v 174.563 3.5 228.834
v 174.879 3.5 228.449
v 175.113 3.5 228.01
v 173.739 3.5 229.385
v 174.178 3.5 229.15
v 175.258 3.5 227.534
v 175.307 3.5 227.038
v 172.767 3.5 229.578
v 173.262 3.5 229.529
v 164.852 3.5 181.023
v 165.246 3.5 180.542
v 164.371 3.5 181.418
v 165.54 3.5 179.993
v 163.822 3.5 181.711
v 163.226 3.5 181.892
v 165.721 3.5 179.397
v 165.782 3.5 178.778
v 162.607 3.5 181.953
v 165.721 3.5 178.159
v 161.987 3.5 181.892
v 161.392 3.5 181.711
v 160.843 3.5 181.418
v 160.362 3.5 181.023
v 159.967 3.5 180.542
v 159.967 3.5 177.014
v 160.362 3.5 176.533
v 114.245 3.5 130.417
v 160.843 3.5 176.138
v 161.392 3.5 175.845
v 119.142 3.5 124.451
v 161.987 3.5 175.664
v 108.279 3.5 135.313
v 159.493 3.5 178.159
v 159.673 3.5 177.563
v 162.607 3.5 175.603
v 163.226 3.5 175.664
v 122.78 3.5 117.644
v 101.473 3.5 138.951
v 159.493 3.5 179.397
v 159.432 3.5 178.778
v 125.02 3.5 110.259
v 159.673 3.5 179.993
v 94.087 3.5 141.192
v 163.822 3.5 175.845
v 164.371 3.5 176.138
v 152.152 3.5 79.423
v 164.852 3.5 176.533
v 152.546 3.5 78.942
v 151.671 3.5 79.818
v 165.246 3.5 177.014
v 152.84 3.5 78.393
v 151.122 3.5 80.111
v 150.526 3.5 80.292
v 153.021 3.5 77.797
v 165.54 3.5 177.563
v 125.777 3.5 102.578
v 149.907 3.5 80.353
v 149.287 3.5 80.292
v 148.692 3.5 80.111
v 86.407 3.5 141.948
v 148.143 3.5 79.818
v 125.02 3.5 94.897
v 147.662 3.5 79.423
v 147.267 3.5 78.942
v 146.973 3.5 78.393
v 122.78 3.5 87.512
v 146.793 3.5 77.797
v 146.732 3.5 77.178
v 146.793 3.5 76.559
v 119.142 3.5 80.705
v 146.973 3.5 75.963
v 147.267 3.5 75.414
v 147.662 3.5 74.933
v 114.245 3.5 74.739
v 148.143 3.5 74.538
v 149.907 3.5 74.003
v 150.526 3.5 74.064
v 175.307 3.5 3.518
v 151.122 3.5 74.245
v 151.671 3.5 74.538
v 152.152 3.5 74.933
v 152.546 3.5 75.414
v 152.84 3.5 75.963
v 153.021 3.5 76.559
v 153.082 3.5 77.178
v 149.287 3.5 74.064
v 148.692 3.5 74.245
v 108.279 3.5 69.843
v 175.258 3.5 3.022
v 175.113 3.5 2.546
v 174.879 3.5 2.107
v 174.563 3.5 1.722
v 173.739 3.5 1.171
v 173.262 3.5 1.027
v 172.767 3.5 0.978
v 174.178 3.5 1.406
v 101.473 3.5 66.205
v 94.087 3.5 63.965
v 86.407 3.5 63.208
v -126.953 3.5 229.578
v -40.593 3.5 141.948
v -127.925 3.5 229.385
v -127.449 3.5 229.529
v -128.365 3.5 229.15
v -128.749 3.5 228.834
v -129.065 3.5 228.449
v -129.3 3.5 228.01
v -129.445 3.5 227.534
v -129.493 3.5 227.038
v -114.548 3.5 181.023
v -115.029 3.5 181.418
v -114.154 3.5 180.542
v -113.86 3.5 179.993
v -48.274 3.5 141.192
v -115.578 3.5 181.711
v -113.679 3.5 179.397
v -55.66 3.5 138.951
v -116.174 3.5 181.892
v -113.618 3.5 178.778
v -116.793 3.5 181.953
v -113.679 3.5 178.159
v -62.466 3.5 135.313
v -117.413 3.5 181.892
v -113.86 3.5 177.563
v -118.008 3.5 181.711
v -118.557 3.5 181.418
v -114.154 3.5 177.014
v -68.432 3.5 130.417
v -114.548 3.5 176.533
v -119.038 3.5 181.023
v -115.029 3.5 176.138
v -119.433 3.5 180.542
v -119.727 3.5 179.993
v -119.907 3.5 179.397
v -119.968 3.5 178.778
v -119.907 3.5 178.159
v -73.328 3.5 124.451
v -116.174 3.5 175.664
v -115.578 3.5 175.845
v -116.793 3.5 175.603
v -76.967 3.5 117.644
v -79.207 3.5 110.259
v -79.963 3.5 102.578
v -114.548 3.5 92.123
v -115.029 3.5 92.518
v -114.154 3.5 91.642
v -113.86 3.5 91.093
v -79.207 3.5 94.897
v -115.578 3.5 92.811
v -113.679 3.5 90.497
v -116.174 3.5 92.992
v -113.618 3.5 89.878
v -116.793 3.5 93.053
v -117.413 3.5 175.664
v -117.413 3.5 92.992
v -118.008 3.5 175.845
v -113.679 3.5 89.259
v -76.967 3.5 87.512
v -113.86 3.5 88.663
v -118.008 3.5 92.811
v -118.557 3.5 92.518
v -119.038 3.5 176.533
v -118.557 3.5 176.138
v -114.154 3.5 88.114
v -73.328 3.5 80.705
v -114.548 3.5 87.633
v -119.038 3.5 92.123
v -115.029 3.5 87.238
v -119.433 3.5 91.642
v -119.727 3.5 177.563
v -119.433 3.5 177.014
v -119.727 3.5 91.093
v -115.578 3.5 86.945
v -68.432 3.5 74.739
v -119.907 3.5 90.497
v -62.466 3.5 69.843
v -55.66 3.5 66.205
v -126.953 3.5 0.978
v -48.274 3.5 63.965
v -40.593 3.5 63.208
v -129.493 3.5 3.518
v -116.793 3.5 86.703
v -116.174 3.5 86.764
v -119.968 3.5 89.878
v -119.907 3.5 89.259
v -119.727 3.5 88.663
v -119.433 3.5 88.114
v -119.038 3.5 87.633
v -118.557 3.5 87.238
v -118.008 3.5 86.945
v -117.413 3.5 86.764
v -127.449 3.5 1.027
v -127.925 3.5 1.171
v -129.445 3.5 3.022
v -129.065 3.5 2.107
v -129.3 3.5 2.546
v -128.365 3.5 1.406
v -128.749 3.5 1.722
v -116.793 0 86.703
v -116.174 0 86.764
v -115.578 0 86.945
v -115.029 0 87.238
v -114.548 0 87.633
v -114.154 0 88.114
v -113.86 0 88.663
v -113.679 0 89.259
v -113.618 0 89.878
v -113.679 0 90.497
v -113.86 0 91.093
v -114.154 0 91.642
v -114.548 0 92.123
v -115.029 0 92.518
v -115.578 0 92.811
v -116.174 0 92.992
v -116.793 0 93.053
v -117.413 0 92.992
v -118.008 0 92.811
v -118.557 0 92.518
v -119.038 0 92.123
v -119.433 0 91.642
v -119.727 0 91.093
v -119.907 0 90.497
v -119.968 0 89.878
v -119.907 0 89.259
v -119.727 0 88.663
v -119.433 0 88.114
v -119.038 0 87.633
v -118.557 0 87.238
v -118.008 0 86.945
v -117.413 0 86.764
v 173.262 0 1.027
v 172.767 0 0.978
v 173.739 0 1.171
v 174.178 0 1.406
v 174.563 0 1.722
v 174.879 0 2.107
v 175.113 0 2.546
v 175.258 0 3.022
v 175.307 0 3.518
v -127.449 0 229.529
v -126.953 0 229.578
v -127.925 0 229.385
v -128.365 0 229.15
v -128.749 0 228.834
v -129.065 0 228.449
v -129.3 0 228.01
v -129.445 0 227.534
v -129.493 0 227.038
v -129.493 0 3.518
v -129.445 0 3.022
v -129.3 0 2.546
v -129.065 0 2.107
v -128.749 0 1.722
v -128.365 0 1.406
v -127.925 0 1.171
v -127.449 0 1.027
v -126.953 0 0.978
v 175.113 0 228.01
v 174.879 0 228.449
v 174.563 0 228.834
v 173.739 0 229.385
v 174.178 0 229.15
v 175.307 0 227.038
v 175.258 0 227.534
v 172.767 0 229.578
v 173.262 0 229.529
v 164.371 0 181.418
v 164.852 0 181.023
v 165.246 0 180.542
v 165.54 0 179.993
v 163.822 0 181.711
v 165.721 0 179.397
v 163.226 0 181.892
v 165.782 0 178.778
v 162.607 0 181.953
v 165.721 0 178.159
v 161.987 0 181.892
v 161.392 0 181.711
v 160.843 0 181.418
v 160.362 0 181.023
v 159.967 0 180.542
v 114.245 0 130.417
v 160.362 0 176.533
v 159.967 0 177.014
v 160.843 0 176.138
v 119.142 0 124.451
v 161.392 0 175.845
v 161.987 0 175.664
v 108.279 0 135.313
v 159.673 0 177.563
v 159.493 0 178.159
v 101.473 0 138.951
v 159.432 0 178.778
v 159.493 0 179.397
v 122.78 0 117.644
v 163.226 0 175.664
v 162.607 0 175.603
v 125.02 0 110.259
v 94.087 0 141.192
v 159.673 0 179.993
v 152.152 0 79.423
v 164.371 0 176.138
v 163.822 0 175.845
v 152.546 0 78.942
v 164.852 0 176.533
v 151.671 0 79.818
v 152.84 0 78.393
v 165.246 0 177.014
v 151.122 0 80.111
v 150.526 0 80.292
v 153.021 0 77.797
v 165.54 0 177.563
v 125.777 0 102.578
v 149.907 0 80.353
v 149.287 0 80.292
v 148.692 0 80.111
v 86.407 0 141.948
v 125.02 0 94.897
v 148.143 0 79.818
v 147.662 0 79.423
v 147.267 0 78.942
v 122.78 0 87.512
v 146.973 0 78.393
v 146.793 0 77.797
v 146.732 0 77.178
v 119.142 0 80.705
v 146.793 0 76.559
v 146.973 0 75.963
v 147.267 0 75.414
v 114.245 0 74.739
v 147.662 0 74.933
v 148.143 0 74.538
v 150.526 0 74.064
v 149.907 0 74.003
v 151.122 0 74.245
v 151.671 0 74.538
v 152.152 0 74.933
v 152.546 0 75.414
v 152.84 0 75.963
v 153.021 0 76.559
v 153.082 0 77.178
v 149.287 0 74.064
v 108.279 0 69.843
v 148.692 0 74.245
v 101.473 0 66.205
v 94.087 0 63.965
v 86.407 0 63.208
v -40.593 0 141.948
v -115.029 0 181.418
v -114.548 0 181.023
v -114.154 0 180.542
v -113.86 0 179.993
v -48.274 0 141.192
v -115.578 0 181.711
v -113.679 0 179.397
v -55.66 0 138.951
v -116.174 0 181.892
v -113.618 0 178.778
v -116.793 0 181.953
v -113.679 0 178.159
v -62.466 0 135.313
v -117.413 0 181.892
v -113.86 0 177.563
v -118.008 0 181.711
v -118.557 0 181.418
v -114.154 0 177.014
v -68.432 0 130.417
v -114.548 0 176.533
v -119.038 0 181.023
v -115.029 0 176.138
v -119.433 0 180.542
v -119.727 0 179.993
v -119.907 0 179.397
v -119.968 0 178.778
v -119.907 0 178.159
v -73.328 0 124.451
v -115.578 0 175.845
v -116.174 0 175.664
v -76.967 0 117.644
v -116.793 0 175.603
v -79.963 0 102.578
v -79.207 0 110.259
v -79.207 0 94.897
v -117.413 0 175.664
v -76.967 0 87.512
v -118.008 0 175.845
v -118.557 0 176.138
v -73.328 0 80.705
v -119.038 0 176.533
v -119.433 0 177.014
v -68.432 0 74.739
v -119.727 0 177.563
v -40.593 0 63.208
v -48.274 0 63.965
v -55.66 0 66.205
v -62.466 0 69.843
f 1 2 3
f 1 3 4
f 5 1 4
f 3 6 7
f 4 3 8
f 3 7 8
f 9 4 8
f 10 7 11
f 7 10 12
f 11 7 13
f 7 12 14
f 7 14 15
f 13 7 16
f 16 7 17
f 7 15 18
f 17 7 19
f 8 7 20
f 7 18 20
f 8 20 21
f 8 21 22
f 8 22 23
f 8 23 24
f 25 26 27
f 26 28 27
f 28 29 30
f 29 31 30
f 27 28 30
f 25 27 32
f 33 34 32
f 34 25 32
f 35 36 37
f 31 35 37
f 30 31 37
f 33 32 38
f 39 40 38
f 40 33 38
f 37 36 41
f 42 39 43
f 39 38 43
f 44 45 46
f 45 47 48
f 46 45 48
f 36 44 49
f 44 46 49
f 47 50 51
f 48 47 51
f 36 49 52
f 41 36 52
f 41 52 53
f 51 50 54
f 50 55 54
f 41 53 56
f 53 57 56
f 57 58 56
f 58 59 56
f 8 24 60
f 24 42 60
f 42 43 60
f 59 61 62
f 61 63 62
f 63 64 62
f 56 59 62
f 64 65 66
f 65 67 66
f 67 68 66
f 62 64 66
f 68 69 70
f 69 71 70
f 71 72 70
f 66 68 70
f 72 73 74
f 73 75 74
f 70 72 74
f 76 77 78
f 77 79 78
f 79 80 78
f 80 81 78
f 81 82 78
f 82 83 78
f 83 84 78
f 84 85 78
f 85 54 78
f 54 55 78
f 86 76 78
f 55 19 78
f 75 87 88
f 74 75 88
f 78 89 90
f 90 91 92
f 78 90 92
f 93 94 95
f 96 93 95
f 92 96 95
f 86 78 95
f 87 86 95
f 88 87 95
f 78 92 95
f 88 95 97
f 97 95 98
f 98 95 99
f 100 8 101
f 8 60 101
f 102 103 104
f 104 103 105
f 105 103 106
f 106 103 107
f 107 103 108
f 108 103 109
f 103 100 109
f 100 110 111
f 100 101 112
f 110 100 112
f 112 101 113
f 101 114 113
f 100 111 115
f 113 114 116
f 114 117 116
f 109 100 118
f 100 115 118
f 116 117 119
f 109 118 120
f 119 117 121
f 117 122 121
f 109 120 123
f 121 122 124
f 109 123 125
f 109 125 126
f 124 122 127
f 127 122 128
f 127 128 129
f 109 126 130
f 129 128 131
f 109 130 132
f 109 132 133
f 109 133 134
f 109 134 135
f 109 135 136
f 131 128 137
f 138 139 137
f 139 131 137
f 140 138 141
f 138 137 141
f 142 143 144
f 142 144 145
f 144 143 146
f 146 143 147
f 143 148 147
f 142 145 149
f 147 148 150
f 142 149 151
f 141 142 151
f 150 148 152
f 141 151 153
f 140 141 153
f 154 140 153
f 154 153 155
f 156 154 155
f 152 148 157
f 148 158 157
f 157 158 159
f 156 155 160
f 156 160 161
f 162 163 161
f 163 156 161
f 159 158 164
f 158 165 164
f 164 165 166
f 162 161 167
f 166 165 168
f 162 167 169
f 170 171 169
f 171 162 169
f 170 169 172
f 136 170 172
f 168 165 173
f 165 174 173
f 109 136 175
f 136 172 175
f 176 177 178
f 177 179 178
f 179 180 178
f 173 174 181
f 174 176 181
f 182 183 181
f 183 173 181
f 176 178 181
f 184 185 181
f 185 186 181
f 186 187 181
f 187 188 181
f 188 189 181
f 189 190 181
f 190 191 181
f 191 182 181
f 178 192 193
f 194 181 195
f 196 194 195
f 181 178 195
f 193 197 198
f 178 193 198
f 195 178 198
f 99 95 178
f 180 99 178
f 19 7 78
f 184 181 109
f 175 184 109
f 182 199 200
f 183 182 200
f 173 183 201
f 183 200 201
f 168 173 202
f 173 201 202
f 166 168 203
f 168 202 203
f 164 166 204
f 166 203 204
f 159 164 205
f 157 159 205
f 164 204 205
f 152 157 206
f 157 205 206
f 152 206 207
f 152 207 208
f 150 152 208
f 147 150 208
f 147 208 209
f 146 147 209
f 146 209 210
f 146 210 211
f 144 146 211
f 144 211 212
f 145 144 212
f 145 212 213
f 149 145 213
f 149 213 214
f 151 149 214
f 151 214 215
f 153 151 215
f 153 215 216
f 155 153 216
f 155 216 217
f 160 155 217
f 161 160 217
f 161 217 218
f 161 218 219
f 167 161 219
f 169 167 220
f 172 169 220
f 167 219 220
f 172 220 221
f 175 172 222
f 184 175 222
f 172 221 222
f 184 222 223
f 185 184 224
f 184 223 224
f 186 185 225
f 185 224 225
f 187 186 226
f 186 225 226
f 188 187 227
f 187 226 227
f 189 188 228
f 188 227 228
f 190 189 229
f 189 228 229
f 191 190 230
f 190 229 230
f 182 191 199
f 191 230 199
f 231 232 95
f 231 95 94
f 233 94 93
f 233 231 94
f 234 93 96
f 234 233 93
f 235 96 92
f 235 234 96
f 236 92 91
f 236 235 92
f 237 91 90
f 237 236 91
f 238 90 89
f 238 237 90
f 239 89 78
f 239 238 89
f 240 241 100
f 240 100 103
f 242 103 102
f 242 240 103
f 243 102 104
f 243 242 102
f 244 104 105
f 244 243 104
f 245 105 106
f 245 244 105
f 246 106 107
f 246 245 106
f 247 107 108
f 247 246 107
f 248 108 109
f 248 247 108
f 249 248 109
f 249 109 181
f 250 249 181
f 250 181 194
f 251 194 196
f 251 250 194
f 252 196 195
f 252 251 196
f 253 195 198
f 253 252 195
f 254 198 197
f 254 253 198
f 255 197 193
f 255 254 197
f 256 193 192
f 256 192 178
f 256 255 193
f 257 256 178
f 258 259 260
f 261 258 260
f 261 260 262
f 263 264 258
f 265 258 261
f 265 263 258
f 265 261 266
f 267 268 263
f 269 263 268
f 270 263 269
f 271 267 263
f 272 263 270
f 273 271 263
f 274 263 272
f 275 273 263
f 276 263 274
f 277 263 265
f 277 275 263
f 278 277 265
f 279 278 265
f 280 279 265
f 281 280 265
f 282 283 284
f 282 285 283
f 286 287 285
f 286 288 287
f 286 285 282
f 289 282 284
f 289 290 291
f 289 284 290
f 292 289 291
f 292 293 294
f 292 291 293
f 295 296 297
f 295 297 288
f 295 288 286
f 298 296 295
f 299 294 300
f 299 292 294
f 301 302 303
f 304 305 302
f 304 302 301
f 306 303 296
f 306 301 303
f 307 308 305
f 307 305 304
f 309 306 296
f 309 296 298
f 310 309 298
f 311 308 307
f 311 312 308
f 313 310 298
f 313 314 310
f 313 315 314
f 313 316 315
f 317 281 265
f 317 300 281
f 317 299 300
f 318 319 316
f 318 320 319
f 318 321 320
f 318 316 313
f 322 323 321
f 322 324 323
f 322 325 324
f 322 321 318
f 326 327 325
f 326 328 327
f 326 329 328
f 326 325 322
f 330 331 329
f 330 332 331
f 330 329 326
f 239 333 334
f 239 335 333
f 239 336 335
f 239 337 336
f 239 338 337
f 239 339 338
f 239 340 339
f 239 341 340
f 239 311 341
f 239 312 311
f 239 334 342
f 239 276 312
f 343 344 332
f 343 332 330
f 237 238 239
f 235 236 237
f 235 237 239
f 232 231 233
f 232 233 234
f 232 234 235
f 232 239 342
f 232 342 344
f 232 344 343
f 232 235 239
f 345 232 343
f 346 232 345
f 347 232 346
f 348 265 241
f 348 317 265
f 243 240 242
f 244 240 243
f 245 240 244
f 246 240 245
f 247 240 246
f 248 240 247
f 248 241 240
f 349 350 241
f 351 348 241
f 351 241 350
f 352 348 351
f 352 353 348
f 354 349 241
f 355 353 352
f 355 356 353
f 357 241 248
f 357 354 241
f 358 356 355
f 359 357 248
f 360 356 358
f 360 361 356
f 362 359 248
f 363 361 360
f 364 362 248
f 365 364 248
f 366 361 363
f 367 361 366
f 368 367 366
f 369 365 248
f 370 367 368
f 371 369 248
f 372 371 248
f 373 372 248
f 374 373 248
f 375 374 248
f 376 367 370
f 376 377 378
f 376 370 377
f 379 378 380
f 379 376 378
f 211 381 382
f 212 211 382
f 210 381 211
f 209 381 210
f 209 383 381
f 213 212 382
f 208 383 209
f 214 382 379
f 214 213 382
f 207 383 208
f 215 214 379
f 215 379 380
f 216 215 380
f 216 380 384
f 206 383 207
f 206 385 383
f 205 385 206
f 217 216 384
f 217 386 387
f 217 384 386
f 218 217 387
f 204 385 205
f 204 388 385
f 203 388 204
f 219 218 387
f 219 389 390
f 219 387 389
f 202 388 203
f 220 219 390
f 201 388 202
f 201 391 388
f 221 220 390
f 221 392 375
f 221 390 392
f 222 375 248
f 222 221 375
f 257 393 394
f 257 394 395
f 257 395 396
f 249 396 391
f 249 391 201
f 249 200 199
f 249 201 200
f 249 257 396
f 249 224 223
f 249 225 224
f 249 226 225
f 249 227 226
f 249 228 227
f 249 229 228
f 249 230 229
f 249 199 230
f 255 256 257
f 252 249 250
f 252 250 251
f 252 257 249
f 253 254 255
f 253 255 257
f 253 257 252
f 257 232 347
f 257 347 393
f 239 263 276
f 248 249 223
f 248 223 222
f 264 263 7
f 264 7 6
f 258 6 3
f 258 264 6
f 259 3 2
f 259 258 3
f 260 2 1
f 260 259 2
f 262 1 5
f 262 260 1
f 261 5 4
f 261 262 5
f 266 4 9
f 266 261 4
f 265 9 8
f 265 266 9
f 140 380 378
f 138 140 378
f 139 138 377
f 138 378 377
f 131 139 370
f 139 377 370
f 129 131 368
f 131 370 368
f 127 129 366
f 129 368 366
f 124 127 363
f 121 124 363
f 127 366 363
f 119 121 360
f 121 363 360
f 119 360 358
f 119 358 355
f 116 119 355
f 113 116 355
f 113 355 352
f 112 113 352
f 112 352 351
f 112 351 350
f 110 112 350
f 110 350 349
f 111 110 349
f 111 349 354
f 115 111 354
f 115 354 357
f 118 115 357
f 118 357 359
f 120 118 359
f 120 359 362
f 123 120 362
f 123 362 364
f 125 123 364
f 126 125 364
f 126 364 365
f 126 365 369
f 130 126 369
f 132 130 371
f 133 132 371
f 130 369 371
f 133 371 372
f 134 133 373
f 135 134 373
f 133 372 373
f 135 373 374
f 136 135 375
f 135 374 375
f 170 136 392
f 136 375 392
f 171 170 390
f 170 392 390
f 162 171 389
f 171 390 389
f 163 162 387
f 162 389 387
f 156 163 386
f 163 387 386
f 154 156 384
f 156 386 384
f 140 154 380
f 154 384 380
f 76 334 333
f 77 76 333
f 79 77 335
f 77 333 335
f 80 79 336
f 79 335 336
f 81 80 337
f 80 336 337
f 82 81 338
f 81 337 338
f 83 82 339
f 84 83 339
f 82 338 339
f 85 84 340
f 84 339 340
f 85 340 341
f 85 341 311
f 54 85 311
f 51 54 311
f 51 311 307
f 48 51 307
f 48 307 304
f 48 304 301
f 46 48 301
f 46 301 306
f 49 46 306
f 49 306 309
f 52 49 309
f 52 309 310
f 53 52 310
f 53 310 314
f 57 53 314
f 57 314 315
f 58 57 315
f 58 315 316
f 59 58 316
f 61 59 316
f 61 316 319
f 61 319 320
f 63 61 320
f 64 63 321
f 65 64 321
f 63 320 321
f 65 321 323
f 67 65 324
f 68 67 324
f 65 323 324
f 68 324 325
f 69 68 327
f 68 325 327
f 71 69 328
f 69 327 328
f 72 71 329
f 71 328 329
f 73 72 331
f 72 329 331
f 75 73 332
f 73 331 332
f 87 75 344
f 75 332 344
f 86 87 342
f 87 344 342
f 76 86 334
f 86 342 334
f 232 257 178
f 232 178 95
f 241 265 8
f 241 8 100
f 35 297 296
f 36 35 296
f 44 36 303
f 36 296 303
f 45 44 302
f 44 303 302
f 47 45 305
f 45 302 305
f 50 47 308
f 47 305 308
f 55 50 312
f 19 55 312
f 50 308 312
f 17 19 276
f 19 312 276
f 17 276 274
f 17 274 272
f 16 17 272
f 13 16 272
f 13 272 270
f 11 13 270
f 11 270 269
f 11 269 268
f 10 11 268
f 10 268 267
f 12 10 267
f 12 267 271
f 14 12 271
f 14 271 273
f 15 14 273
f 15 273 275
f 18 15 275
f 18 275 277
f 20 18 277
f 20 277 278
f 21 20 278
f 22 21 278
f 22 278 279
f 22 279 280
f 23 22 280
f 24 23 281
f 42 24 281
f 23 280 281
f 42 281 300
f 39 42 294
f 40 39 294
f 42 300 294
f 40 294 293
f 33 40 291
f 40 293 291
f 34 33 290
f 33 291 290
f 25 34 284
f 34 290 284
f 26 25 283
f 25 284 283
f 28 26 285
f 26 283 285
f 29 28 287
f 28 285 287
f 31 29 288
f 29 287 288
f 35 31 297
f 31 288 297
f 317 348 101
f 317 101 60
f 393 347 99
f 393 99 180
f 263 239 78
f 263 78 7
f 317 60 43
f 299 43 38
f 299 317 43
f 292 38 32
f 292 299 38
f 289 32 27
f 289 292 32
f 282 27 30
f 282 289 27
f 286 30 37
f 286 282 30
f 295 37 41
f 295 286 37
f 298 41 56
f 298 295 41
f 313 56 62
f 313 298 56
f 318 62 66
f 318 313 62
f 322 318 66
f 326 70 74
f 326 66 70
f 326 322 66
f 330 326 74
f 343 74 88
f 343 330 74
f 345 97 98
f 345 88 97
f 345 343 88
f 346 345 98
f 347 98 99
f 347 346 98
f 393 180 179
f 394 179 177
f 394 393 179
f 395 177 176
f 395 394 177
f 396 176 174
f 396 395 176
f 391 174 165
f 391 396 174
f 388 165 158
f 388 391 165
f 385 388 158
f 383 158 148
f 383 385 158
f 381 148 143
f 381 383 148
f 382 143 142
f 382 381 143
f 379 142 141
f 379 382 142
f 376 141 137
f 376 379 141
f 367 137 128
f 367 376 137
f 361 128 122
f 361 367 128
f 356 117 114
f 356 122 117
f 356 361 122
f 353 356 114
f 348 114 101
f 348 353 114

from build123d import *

# Parameters (mm, degrees)
BOSS_EXTRUDE1_DEPTH = 3.5
CUT_EXTRUDE7_DEPTH  = 289.878374321
SKETCH8_R           = 3.175
CUT_EXTRUDE8_DEPTH  = 289.878374321


with BuildPart() as part:
    # Sketch1 → Boss-Extrude1 (new body)
    with BuildSketch(Plane(origin=(0, 0, 0), x_dir=(1, 0, 0), z_dir=(0, 1, 0))):
        with BuildLine():
            Line((-126.953423408, -0.978024545), (172.766576592, -0.978024545))
            ThreePointArc((172.766576592, -0.978024545), (174.562627816, -1.721973321), (175.306576592, -3.518024545))
            Line((175.306576592, -3.518024545), (175.306576592, -227.038024545))
            ThreePointArc((175.306576592, -227.038024545), (174.562627816, -228.834075769), (172.766576592, -229.578024545))
            Line((172.766576592, -229.578024545), (-126.953423408, -229.578024545))
            ThreePointArc((-126.953423408, -229.578024545), (-128.749474632, -228.834075769), (-129.493423408, -227.038024545))
            Line((-129.493423408, -227.038024545), (-129.493423408, -3.518024545))
            ThreePointArc((-129.493423408, -3.518024545), (-128.749474632, -1.721973321), (-126.953423408, -0.978024545))
        make_face()
    extrude(amount=BOSS_EXTRUDE1_DEPTH)

    # Sketch7 → Cut-Extrude7 (cut, through all)
    with BuildSketch(Plane(origin=(0, 0, 0), x_dir=(-1, 0, 0), z_dir=(0, -1, 0))):
        with BuildLine():
            Line((40.593423408, -141.948024545), (-86.406576592, -141.948024545))
            ThreePointArc((-86.406576592, -141.948024545), (-125.776576592, -102.578024545), (-86.406576592, -63.208024545))
            Line((-86.406576592, -63.208024545), (40.593423408, -63.208024545))
            ThreePointArc((40.593423408, -63.208024545), (79.963423408, -102.578024545), (40.593423408, -141.948024545))
        make_face()
    extrude(amount=-CUT_EXTRUDE7_DEPTH, mode=Mode.SUBTRACT)

    # Sketch8 → Cut-Extrude8 (cut, through all)
    with BuildSketch(Plane(origin=(0, 0, 0), x_dir=(-1, 0, 0), z_dir=(0, -1, 0))):
        with Locations(Location((-149.906576592, -77.178024545, 0), (0, 0, 90))):
            Circle(SKETCH8_R)
        with Locations(Location((116.793423408, -89.878024545, 0), (0, 0, 90))):
            Circle(SKETCH8_R)
        with Locations(Location((116.793423408, -178.778024545, 0), (0, 0, 90))):
            Circle(SKETCH8_R)
        with Locations(Location((-162.606576592, -178.778024545, 0), (0, 0, 90))):
            Circle(SKETCH8_R)
    extrude(amount=-CUT_EXTRUDE8_DEPTH, mode=Mode.SUBTRACT)


solid = part.part
